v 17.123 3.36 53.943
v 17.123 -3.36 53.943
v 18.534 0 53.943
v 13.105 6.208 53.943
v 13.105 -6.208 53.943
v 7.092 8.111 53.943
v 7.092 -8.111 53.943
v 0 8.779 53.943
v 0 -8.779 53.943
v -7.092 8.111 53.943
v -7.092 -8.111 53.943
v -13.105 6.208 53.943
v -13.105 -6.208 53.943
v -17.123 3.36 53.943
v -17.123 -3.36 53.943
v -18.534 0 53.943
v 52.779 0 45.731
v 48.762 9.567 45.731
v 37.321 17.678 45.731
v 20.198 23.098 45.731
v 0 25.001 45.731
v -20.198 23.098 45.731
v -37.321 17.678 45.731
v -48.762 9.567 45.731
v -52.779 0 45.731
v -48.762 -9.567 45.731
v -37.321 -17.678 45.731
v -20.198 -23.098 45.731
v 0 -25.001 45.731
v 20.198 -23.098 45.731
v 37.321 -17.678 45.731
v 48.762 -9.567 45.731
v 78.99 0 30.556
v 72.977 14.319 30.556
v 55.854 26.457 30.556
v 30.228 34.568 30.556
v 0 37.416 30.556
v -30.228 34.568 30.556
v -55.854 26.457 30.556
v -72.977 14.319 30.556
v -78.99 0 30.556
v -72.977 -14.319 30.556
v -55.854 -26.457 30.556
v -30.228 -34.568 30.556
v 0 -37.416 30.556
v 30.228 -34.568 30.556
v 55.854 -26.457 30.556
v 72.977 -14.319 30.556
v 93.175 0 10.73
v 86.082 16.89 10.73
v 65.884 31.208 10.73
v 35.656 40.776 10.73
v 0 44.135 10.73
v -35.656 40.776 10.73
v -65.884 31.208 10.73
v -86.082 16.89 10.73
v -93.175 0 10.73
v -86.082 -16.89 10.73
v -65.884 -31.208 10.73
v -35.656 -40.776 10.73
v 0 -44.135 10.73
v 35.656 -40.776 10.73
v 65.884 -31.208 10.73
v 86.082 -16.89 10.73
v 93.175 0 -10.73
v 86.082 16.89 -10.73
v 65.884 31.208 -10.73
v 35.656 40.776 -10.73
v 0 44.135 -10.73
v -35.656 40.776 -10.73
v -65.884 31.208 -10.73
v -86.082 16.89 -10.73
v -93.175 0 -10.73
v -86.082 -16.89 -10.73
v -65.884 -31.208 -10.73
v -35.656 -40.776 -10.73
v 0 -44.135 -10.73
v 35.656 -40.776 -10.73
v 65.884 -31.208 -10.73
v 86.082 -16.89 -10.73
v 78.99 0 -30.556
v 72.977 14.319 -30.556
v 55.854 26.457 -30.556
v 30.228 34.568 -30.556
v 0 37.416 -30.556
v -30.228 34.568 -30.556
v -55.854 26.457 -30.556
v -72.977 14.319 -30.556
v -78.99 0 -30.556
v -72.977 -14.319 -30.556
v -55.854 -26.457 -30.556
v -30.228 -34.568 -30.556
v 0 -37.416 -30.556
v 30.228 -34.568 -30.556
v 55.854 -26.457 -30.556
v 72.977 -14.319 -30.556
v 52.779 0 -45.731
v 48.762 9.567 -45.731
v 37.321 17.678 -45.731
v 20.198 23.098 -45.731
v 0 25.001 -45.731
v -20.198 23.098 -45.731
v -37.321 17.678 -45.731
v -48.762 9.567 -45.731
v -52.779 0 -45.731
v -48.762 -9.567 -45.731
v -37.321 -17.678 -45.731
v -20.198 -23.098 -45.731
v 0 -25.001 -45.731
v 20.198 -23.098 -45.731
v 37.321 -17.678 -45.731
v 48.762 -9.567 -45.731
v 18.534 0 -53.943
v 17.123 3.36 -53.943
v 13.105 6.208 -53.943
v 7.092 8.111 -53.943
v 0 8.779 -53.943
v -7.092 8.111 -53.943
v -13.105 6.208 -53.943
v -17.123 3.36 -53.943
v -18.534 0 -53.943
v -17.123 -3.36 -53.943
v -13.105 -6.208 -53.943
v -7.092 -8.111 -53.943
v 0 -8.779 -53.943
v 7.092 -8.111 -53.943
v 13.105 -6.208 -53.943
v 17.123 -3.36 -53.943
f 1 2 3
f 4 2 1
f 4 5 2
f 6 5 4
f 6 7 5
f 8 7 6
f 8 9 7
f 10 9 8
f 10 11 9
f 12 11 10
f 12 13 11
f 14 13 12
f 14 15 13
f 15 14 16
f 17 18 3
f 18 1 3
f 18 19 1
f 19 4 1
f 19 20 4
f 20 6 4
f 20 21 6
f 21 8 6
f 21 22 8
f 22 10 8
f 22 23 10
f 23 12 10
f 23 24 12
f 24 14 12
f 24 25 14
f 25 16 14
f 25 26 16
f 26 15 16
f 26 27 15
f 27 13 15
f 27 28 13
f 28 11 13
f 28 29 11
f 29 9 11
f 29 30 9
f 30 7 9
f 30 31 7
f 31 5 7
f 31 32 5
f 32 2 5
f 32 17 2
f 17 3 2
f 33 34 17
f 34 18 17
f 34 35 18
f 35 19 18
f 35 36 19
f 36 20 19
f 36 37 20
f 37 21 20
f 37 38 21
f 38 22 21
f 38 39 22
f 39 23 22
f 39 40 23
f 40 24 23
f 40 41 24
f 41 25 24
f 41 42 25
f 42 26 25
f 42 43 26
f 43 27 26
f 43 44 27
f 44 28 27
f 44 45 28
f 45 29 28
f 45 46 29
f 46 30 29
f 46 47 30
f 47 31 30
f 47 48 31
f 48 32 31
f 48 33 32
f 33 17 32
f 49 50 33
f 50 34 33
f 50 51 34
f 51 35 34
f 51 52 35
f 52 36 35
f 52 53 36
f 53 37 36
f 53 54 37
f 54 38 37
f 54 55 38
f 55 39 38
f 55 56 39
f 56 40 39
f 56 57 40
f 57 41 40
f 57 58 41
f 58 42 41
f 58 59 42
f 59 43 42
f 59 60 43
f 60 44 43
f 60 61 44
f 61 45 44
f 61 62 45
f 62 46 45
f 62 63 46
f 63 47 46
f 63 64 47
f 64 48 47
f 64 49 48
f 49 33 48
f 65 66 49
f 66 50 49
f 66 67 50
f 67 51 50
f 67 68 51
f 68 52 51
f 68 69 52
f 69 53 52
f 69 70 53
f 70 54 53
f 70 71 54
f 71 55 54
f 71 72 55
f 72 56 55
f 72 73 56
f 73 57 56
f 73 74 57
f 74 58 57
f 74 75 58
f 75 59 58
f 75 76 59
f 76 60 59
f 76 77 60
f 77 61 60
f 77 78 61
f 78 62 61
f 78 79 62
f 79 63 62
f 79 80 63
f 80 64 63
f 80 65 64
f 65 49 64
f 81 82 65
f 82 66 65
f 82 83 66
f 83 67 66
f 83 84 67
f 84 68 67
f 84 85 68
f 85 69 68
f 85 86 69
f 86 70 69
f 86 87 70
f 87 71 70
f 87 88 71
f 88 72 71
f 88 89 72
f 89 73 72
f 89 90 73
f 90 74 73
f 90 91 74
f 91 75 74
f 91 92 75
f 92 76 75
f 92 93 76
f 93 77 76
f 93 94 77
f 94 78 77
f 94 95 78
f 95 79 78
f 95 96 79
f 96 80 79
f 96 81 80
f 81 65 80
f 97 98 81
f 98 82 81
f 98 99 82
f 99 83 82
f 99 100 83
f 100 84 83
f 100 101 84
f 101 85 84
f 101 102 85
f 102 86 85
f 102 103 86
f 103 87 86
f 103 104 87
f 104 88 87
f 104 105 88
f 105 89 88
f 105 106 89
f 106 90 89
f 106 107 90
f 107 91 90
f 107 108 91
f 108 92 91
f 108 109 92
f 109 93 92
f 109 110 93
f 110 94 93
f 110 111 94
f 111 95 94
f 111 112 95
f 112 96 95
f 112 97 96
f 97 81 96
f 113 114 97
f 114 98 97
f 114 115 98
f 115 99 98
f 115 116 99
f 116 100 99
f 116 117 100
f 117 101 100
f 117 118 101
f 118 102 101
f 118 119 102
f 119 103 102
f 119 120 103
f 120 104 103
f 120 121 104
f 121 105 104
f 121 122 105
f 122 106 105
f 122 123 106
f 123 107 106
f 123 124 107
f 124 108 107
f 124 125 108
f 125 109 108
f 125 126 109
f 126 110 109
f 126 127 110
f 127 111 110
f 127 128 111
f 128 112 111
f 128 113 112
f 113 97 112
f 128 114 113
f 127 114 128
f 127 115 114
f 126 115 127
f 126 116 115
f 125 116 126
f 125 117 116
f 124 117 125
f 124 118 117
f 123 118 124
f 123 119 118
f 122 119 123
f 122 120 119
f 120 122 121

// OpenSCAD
// Generated by SolidPython 1.0.1 on 2020-07-29 00:46:54


scale(v = [19, 9, 11]) {
	sphere(r = 5);
}
/***********************************************
*********      SolidPython code:      **********
************************************************
 
# import packages: SolidPython
from solid import *
from solid.utils import *
from itertools import chain, combinations, permutations


class Resize:

    def __init__(self, scad_file):
        self.scad_file = scad_file
        #self.scad_file = import_scad(scad_file)
        # cone/cylinder param:
        self.r1 = 0
        self.r2 = 0
        self.h = 0
        # rectangular prism param:
        self.w = 0
        self.l = 0
        # ellipse param:
        self.r = 0

    # import OpenScad code (file name corresponds to shape)


    # classify shape + parameters
    def assign(self, param1, param2, param3):
        if self.scad_file == 'cone.scad':
            self.r1 = param1
            self.r2 = param2
            self.h = param3
        elif self.scad_file == 'cylinder.scad':
            self.r1 = param1
            self.r2 = param2
            self.h = param3
        elif self.scad_file == 'rectangularPrism.scad':
            self.h = param1
            self.l = param2
            self.w = param3
        else:
            self.r = param1
            self.h = param2

    # resize parameters
    def iterate(self):
        x = range(3, 20, 2)
        i = 1
        if self.scad_file == 'cone.scad':
            tempList = list(permutations(x, 2))
            for temp in tempList:
                param1 = temp[0]
                param2 = temp[1]
                filepath = 'produced_scad_files/' + 'cone' + str(param1) + '_' + str(param2) + '_' + '.scad'
                scad_render_to_file(cylinder(h=param1, r1=param2, r2=0), filepath)

        elif self.scad_file == 'cylinder.scad':
            tempList = list(permutations(x, 3))
            for temp in tempList:
                param1 = temp[0]
                param2 = temp[1]
                filepath = 'produced_scad_files/' + 'cylinder' + str(param1) + '_' + str(param2) + '_' + '.scad'
                scad_render_to_file(cylinder(h=param1, r1=param2, r2=param2), filepath)

        elif self.scad_file == 'rectangularPrism.scad':
            tempList = list(permutations(x, 3))
            for temp in tempList:
                param1 = temp[0]
                param2 = temp[1]
                param3 = temp[2]
                filepath = 'produced_scad_files/' + 'rectangularPrism' + str(param1) + '_' + str(param2) + '_' + str(
                    param3) + '.scad'
                scad_render_to_file(cube(size=(param1, param2, param3)), filepath)

        elif self.scad_file == 'ellipse.scad':
            tempList = list(permutations(x, 4))
            for temp in tempList:
                param1 = temp[0]
                param2 = temp[1]
                param3 = temp[2]
                param4 = temp[3]
                filepath = 'produced_scad_files/' + 'ellipse' + str(param1) + '_' + str(param2) + '_' + str(param3) + '_' + str(param4) + '.scad'
                scad_render_to_file(scale([param1, param2, param3])(sphere(r=param4)), filepath)

    def render_to_scadfile(self):
        scad_render_to_file(scad, 'example.scad') 
 
************************************************/
